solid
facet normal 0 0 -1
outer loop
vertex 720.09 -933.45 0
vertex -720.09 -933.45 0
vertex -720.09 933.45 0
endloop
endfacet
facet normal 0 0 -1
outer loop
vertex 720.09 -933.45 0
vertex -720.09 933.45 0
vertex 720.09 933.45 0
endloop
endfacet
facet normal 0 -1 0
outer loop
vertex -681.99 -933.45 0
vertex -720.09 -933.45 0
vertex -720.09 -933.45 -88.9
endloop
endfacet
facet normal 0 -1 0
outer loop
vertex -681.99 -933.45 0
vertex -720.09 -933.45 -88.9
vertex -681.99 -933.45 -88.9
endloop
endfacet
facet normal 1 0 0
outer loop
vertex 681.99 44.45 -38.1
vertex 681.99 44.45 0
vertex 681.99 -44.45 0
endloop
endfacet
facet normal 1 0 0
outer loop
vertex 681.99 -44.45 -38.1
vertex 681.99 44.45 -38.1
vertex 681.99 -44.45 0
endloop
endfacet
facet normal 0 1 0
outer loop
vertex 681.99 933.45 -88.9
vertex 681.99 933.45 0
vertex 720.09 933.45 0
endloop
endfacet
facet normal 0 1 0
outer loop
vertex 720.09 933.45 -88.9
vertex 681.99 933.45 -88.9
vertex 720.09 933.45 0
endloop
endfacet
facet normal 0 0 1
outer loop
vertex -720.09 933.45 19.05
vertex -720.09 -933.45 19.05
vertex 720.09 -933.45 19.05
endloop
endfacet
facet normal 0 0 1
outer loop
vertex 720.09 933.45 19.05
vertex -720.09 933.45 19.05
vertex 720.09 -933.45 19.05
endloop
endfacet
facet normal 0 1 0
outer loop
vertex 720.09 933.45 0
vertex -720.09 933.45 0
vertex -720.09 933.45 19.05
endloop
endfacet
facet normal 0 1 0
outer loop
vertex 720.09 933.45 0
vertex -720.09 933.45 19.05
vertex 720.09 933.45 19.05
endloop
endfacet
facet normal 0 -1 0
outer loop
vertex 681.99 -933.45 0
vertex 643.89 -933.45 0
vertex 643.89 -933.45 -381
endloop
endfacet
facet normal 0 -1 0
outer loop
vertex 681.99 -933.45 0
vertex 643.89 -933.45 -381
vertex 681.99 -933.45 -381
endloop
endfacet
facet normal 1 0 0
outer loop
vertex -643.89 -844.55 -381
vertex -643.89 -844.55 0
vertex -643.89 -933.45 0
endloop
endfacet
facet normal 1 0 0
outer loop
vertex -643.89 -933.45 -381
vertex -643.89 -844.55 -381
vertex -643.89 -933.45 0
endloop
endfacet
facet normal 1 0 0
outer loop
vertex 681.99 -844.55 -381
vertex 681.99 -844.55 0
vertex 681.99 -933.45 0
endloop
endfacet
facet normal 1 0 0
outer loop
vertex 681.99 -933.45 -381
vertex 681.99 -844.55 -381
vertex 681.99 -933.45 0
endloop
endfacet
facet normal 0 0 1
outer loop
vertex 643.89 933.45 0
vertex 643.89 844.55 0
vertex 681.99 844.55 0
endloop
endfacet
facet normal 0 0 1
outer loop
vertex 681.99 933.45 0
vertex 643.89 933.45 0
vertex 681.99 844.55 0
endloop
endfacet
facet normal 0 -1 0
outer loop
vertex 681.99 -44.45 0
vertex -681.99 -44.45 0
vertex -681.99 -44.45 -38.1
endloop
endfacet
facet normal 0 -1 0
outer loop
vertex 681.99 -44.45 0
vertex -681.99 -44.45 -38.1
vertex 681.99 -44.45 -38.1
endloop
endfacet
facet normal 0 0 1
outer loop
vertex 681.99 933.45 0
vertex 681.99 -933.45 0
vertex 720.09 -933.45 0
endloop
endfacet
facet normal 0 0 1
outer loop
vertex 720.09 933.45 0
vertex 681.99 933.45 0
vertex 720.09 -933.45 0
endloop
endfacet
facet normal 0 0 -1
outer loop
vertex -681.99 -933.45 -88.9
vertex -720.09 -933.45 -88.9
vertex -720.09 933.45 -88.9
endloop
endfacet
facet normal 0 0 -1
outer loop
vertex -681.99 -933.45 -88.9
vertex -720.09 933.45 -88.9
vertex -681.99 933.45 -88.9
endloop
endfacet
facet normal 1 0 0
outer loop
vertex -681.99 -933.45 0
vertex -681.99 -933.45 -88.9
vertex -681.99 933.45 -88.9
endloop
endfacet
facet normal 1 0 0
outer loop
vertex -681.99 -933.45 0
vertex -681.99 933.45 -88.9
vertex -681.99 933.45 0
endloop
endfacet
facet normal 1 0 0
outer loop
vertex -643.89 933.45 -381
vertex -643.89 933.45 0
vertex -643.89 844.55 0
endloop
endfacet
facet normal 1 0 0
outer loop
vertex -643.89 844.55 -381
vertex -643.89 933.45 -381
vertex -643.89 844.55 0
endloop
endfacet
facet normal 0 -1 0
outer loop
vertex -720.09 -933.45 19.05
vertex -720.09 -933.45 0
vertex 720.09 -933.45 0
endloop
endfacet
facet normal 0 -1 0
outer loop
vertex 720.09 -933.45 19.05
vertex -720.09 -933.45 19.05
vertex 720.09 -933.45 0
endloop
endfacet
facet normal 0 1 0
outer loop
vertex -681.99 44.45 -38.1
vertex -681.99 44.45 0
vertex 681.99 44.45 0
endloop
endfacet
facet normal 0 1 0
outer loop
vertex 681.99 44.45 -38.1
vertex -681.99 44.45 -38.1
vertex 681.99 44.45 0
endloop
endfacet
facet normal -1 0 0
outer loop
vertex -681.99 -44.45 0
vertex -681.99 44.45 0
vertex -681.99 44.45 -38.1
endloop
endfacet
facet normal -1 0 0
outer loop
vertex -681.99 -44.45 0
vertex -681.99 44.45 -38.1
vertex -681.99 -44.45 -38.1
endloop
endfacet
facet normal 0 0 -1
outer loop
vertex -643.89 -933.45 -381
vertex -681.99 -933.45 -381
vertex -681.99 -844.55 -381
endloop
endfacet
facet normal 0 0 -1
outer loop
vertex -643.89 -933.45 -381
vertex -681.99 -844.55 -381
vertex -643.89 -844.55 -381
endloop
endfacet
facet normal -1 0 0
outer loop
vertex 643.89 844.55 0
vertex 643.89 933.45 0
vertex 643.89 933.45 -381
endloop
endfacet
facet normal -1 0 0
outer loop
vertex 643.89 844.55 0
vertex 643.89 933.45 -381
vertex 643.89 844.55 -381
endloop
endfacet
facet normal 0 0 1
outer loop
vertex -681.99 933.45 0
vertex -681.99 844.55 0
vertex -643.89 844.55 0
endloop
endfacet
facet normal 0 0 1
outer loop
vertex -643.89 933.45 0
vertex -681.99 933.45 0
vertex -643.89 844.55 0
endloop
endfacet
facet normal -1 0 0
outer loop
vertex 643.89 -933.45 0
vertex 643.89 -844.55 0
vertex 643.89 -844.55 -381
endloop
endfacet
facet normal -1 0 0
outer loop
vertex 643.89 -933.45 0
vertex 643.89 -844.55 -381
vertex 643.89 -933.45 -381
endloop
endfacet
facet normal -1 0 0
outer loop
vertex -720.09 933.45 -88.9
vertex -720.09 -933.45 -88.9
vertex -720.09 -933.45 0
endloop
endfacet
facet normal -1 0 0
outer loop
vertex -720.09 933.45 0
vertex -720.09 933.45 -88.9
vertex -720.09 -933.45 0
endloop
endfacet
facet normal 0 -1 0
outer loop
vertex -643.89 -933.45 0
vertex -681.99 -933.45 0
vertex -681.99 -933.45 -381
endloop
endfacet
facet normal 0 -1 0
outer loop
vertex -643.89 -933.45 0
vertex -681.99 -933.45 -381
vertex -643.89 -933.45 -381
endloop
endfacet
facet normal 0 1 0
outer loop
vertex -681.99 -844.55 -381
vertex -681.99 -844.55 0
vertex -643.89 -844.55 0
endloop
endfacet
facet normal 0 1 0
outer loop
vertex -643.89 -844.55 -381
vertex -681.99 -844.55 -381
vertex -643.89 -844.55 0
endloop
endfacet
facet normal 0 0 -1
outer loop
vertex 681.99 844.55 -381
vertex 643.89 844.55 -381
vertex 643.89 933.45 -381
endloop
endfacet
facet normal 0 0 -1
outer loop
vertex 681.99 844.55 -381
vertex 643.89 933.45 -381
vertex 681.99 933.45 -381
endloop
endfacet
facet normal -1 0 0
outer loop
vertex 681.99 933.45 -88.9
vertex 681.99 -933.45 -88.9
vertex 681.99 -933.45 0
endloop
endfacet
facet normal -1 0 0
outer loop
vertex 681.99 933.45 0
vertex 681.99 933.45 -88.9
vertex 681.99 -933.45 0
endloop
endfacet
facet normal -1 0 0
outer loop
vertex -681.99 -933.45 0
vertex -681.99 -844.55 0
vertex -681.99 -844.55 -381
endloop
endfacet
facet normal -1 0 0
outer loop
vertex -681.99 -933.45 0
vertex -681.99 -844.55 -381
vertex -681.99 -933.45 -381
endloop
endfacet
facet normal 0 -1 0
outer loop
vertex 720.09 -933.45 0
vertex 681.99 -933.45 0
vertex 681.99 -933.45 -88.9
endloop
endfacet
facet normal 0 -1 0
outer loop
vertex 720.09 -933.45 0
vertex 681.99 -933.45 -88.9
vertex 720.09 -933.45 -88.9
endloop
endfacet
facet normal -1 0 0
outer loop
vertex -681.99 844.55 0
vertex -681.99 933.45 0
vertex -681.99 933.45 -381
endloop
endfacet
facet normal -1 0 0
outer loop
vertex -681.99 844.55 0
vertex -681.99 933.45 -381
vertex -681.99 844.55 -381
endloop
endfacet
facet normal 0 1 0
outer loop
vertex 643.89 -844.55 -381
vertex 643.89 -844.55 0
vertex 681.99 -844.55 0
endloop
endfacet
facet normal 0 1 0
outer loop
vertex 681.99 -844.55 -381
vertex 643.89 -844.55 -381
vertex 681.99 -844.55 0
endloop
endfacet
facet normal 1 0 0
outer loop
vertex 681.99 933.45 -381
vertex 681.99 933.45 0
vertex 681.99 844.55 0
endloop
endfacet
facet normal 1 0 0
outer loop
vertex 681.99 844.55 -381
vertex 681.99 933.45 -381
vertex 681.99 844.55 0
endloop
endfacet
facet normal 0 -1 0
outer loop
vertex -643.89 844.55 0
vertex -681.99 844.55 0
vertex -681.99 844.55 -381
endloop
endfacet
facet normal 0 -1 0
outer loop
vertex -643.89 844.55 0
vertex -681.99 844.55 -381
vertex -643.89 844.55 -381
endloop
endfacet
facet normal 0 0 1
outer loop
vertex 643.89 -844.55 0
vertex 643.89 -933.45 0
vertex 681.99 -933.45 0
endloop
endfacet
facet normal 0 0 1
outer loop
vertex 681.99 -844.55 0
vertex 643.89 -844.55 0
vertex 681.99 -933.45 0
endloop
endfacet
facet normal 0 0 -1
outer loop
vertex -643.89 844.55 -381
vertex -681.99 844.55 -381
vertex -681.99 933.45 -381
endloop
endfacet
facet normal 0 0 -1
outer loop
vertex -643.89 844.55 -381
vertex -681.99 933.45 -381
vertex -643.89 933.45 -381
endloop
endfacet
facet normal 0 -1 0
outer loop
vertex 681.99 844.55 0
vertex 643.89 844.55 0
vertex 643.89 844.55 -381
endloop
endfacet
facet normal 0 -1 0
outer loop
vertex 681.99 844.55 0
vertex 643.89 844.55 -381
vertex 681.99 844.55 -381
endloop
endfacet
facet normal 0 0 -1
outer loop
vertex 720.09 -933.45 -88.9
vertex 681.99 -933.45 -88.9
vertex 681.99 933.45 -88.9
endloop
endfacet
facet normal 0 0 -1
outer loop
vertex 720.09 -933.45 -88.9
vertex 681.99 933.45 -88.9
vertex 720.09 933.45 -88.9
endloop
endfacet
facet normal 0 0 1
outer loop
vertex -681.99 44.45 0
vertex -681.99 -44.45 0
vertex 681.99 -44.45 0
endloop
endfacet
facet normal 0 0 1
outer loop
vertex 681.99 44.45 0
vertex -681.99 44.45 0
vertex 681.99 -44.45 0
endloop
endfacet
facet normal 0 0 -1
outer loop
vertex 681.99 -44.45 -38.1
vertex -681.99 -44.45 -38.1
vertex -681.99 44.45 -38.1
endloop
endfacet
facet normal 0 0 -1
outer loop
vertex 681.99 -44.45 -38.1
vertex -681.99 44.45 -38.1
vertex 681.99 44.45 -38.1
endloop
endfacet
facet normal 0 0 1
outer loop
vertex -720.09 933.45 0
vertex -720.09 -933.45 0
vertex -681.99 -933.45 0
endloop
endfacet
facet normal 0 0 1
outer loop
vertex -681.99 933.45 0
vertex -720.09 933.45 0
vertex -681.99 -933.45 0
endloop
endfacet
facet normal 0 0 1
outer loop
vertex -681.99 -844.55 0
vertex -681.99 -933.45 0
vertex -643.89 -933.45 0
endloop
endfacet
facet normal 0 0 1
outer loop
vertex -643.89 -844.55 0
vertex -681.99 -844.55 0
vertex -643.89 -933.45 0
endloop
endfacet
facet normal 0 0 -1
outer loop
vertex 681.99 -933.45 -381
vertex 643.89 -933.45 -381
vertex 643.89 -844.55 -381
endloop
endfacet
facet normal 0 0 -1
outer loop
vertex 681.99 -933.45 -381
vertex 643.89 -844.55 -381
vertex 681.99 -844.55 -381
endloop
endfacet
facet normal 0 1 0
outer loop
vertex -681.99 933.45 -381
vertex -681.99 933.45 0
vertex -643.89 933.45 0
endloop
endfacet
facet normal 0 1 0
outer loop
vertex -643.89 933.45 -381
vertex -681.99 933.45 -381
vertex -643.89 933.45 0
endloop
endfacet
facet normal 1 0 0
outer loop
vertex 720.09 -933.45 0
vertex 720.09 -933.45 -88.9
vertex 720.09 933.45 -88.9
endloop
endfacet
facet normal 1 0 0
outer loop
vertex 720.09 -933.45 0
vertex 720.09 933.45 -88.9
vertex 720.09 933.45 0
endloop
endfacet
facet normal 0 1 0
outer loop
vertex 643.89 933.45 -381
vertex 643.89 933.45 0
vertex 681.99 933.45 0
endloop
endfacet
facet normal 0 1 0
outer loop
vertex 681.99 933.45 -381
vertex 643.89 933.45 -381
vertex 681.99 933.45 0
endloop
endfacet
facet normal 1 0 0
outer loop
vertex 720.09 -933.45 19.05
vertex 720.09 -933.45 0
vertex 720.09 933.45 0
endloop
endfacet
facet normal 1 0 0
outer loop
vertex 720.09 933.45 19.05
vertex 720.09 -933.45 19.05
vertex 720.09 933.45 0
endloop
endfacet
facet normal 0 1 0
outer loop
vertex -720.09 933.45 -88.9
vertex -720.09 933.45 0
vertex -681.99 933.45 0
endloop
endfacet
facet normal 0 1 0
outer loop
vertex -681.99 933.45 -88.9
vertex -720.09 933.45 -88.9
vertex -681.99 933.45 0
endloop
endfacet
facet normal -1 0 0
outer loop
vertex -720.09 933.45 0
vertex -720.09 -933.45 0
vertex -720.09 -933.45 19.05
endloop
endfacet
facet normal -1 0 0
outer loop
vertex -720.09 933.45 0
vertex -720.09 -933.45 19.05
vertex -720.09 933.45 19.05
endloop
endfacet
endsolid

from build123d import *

# Parameters (mm, degrees)
F0_W     = 1440.18
F0_H     = 1866.9
F1_DEPTH = 19.05
F2_W     = 38.1
F2_H     = 88.9
F3_DEPTH = 1866.9
F4_W     = 38.1
F4_H     = 88.9
F5_DEPTH = 381
F6_W     = 1363.98
F6_H     = 88.9
F7_DEPTH = 38.1


with BuildPart() as f1:
    # F0 (on Top) → F1 (new body)
    with BuildSketch(Plane.XY):
        Rectangle(F0_W, F0_H)
    extrude(amount=F1_DEPTH)


with BuildPart() as f3:
    # F2 (on face) → F3 (new body, through all)
    with BuildSketch(Plane.XZ.offset(933.45)):
        with Locations((701.04, -44.45)):
            Rectangle(F2_W, F2_H)
        with Locations((-701.04, -44.45)):
            Rectangle(F2_W, F2_H)
    extrude(amount=-F3_DEPTH)


with BuildPart() as f5:
    # F4 (on face) → F5 (new body)
    with BuildSketch(Plane(origin=(0, 0, 0), x_dir=(1, 0, 0), z_dir=(0, 0, -1))):
        with Locations((-662.94, 889)):
            Rectangle(F4_W, F4_H)
        with Locations((662.94, 889)):
            Rectangle(F4_W, F4_H)
        with Locations((-662.94, -889)):
            Rectangle(F4_W, F4_H)
        with Locations((662.94, -889)):
            Rectangle(F4_W, F4_H)
    extrude(amount=F5_DEPTH)


with BuildPart() as f7:
    # F6 (on face) → F7 (new body)
    with BuildSketch(Plane(origin=(0, 0, 0), x_dir=(1, 0, 0), z_dir=(0, 0, -1))):
        Rectangle(F6_W, F6_H)
    extrude(amount=F7_DEPTH)


solid = Compound([f1.part, f3.part, f5.part, f7.part])
